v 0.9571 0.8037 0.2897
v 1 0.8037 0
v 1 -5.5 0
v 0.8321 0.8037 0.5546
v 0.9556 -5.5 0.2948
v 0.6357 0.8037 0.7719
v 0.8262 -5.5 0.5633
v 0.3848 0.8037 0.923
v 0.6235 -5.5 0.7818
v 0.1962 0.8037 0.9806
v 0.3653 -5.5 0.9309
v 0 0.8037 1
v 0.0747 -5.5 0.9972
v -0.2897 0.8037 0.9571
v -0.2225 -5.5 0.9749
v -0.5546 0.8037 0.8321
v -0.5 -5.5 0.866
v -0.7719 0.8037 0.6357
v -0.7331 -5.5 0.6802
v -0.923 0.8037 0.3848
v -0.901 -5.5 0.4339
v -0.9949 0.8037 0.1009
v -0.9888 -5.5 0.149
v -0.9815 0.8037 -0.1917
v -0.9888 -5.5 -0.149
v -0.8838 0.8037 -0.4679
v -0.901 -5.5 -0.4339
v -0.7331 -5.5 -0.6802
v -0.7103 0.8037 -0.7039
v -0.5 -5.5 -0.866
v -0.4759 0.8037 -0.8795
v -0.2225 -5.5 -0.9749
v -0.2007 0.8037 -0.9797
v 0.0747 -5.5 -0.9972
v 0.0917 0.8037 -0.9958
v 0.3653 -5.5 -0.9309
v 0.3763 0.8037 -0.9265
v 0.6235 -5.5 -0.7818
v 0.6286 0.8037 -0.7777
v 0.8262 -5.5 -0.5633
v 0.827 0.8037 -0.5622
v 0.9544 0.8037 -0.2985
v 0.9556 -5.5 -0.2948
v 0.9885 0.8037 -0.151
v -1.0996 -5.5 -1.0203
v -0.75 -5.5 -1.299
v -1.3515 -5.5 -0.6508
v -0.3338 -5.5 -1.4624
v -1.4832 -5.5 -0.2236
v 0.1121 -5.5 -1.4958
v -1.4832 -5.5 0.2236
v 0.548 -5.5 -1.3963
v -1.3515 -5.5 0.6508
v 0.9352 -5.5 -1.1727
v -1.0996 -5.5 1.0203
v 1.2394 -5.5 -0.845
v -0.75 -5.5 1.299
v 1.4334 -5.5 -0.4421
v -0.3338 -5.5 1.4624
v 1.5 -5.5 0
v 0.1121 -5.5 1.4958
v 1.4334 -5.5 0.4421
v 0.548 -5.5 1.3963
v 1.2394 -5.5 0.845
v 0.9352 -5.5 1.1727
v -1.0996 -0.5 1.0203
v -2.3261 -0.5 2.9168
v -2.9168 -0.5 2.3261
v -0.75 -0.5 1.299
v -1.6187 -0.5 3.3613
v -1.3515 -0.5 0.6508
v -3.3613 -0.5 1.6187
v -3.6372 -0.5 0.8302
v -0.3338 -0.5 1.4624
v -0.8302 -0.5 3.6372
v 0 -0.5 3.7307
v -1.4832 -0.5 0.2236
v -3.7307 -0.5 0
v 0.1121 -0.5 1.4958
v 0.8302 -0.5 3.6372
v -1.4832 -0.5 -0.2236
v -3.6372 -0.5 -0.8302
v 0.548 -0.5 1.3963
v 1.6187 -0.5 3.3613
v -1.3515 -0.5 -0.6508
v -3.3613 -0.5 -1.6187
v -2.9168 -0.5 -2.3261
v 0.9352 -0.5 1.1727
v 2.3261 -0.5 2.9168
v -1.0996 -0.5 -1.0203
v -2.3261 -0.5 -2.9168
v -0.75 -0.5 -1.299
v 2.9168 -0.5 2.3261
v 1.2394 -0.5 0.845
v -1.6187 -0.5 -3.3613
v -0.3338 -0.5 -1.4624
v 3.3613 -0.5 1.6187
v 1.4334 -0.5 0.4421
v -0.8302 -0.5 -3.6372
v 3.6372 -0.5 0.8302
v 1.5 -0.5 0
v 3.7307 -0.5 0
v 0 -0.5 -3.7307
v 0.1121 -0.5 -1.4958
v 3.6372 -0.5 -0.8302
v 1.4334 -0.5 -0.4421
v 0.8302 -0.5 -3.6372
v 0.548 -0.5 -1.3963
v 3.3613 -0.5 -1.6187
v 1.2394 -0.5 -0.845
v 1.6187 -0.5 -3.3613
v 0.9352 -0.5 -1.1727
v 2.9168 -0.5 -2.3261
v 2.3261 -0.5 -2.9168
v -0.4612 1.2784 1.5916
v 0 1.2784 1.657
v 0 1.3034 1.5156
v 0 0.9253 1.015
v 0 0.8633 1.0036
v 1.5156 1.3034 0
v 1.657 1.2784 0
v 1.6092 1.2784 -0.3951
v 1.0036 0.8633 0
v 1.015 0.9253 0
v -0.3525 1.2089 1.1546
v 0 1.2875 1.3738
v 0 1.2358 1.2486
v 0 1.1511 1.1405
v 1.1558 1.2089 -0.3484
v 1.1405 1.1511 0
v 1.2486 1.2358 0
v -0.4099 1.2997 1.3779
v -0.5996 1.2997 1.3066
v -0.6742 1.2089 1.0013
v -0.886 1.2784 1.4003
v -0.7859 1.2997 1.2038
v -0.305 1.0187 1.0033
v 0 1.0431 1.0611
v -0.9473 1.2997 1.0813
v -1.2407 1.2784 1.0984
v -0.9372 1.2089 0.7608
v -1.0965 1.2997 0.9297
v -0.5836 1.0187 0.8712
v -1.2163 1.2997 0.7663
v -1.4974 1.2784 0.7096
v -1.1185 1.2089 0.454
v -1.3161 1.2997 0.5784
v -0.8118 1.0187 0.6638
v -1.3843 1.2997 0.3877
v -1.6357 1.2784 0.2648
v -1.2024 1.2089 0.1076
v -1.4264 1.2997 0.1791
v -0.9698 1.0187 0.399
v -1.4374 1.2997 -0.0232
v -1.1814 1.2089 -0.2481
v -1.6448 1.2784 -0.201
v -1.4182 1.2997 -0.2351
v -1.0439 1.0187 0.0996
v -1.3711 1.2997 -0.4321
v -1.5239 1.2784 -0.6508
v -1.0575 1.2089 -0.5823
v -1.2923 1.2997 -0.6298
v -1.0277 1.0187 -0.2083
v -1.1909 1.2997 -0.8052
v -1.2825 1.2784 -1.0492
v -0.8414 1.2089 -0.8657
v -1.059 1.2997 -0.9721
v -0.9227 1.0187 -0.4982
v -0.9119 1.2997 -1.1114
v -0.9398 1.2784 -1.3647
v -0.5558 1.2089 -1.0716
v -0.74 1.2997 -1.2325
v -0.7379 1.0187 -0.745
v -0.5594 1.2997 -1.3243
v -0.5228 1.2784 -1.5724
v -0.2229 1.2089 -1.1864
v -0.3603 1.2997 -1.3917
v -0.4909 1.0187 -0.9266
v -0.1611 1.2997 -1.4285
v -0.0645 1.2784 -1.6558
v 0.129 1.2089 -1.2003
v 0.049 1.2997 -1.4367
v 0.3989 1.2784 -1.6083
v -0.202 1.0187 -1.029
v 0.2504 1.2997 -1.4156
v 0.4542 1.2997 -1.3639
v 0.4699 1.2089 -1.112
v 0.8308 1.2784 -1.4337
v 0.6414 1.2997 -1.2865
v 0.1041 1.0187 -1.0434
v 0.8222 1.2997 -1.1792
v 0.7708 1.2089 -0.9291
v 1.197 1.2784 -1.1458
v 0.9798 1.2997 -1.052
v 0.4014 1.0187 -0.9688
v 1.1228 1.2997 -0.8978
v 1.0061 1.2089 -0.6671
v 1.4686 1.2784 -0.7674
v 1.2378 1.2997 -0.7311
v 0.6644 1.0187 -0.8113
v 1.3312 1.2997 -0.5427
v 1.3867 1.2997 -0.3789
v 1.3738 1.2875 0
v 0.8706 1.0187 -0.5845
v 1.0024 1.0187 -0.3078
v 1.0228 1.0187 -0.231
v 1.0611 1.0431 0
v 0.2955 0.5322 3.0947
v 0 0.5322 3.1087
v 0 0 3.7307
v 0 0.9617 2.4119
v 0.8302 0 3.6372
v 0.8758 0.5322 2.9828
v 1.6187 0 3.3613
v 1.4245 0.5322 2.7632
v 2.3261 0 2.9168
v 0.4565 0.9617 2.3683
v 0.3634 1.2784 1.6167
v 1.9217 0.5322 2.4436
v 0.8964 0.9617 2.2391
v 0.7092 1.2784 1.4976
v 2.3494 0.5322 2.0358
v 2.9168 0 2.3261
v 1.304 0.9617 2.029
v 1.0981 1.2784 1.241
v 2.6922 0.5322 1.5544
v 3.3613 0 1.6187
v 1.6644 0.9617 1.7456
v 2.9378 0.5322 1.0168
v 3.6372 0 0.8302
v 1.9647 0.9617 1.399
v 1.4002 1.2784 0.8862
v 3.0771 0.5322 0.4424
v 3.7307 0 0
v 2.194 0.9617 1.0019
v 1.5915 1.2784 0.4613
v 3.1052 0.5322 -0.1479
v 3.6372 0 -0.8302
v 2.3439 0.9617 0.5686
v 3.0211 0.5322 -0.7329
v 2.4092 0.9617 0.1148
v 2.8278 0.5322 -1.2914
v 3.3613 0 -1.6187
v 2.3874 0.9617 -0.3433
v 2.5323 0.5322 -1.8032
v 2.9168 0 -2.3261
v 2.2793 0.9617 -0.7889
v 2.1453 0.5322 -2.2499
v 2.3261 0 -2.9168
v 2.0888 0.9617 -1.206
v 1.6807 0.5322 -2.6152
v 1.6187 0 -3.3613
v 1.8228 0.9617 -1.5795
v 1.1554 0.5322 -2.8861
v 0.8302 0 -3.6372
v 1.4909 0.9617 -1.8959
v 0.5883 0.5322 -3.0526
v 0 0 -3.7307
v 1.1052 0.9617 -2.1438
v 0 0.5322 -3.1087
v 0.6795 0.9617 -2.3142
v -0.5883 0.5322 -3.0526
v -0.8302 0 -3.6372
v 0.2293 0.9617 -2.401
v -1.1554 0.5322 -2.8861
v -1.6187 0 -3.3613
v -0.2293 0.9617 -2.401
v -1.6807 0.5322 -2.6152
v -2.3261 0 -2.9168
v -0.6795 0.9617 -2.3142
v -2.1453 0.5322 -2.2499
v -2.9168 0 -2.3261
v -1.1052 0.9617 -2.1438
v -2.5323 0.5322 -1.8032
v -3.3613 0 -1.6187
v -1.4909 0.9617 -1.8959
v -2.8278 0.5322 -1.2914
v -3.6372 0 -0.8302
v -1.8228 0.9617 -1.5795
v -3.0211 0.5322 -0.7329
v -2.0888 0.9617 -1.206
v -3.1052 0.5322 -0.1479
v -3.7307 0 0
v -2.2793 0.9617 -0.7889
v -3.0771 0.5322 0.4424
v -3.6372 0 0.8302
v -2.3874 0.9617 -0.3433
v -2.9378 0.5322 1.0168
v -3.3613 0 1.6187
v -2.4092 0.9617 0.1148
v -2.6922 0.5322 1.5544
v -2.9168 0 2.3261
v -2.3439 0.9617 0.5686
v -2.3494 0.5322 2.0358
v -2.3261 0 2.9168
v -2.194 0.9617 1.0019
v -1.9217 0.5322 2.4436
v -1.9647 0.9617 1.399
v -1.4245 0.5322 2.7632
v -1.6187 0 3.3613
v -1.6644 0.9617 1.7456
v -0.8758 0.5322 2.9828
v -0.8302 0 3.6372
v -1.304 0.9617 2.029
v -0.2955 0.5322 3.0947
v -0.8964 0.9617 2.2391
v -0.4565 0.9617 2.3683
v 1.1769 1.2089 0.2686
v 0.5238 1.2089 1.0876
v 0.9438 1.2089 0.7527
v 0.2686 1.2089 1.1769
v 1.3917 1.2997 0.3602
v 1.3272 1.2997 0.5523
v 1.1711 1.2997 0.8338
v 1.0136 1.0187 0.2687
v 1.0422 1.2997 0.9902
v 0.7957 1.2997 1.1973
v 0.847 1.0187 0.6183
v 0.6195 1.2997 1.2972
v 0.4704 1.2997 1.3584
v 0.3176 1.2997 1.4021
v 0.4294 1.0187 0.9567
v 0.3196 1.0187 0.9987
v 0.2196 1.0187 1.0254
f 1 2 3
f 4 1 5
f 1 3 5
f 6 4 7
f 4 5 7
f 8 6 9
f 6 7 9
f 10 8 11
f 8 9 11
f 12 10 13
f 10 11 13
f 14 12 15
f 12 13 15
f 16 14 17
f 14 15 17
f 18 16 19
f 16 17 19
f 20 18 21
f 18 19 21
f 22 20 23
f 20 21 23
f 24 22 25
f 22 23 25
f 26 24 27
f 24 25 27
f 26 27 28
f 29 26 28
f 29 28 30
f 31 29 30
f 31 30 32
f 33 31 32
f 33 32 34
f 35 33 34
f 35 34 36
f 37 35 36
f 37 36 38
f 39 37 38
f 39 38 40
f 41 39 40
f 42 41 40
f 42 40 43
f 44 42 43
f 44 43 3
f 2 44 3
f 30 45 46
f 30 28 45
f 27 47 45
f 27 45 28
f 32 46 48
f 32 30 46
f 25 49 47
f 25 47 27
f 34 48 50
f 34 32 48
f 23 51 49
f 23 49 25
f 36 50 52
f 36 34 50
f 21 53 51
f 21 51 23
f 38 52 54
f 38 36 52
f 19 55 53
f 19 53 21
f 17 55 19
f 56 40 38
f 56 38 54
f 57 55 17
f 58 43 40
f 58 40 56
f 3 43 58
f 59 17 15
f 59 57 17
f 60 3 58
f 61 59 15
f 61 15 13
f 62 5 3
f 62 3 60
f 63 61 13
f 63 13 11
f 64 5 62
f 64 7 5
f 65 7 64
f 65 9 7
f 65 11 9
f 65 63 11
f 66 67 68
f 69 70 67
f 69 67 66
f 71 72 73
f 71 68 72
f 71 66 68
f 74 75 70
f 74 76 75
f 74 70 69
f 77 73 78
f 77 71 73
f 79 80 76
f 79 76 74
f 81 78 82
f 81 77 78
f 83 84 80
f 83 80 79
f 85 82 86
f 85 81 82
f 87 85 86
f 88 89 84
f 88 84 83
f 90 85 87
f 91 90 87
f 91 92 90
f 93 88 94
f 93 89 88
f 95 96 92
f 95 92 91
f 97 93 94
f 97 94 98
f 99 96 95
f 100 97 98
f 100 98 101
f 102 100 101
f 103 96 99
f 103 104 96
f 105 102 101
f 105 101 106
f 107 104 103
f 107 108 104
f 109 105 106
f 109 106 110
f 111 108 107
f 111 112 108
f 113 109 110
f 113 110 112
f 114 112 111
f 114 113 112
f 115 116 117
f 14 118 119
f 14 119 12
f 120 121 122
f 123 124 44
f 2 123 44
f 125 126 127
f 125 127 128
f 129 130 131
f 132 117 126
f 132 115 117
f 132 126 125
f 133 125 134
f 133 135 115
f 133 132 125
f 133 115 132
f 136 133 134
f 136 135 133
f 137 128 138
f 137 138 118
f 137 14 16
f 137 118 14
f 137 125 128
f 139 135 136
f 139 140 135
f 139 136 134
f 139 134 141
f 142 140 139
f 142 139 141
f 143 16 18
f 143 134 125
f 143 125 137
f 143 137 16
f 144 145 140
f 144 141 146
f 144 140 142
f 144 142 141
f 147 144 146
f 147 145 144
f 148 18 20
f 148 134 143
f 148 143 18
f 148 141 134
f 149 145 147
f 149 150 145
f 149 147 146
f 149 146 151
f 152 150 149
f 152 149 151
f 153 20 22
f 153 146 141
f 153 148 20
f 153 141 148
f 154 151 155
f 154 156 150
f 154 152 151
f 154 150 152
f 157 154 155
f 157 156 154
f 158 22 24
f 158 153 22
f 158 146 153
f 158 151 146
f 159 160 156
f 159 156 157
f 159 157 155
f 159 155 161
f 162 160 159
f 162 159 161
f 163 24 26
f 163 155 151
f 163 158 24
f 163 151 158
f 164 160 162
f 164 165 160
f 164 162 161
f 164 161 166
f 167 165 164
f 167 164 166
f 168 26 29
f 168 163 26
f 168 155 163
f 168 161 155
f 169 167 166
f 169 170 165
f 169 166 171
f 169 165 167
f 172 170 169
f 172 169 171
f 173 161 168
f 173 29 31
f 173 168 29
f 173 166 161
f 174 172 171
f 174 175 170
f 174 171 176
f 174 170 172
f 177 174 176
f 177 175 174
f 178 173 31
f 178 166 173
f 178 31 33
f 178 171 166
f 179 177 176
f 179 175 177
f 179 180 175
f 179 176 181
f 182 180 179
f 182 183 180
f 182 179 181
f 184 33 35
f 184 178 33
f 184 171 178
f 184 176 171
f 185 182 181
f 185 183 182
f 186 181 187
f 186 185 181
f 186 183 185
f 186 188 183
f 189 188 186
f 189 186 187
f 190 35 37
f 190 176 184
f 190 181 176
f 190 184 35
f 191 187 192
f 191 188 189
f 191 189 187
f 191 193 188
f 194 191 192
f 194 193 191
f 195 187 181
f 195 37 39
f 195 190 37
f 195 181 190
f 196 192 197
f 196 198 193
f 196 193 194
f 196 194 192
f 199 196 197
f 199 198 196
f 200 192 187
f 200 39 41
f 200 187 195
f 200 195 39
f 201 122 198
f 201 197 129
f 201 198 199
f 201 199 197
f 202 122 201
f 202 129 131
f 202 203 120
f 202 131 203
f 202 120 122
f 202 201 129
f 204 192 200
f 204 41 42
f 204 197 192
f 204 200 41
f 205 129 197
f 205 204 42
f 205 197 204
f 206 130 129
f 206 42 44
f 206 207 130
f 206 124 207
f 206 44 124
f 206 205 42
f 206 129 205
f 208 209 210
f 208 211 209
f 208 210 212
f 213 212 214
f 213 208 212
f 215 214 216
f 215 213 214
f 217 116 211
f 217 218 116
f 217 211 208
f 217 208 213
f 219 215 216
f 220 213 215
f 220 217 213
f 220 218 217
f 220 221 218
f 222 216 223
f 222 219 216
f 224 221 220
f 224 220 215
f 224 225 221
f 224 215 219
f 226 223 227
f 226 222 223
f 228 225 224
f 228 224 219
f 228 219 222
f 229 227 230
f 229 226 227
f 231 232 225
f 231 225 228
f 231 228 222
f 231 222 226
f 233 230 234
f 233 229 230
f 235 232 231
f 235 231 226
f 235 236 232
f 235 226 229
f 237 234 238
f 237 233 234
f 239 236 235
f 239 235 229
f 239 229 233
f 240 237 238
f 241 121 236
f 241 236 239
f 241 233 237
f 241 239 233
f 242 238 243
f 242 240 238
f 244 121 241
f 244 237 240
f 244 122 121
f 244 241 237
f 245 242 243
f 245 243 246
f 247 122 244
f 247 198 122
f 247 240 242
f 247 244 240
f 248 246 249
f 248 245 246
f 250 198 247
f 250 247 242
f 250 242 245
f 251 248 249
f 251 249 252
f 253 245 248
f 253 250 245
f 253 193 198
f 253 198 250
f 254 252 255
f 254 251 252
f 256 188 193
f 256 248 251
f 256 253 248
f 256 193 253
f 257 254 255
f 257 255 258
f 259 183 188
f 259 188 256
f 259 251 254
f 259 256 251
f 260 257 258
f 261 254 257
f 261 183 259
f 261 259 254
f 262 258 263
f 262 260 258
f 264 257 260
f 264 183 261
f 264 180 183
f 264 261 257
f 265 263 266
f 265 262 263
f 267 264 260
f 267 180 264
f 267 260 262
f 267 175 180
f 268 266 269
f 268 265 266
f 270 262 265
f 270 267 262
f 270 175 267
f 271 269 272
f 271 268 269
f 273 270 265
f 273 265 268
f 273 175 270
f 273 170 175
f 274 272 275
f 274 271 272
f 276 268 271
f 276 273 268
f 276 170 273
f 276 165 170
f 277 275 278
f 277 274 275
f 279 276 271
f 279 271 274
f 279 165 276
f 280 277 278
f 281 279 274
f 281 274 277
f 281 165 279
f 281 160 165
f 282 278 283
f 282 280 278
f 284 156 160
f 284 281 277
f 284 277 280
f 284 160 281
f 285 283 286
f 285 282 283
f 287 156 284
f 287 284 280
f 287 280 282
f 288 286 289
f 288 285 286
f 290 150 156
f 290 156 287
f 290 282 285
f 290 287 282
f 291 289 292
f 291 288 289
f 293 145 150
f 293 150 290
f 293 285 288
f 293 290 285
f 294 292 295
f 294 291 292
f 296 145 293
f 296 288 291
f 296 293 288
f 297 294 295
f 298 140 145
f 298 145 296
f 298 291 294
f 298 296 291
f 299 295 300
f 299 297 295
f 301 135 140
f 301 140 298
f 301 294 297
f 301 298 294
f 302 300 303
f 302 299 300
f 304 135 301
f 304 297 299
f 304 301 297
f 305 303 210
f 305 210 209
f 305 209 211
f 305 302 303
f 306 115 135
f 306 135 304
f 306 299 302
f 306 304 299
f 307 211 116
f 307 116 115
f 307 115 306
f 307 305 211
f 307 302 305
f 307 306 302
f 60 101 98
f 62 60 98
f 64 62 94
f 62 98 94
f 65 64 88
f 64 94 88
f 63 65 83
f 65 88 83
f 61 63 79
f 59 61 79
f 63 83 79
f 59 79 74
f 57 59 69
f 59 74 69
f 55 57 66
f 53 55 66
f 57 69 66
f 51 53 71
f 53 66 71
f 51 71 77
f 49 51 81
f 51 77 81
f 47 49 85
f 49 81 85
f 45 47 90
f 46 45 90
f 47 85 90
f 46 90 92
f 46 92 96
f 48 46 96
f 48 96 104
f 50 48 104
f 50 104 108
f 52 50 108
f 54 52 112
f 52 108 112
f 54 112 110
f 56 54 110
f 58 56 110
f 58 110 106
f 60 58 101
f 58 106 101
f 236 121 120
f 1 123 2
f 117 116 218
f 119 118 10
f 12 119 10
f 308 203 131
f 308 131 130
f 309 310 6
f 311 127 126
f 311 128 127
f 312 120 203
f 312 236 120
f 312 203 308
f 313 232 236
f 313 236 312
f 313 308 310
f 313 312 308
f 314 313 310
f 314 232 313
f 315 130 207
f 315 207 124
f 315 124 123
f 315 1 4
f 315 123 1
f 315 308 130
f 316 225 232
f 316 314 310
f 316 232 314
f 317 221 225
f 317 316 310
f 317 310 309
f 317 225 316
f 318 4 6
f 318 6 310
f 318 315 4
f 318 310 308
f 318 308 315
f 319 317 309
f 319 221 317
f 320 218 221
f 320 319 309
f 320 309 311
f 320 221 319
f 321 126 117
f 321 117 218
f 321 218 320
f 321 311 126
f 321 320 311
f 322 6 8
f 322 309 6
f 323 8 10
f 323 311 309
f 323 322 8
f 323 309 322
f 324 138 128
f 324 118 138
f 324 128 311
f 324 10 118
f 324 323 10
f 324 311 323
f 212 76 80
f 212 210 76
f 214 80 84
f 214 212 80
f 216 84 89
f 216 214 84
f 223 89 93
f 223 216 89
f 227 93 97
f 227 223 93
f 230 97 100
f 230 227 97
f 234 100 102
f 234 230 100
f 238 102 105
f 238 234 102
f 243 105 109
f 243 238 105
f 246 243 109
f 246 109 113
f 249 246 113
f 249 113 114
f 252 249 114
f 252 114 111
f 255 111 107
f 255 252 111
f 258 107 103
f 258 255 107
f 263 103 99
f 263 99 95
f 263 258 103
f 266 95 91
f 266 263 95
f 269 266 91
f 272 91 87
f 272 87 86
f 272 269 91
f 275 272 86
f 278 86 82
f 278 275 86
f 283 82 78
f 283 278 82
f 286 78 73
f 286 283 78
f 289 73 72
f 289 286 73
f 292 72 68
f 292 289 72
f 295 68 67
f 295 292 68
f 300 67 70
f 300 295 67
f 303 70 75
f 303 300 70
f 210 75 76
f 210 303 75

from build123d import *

# Parameters (mm, degrees)
SKETCH3_R           = 1.5
BOSS_EXTRUDE1_DEPTH = 5
SKETCH4_R           = 1
CUT_EXTRUDE1_DEPTH  = 8.04531685
FILLET1_R           = 0.5


with BuildPart() as part:
    # Sketch2 → Revolve2 (revolve)
    with BuildSketch(Plane(origin=(0, 0, 0), x_dir=(0, 0, -1), z_dir=(1, 0, 0))):
        with BuildLine():
            Line((0, 1.54531685), (0, 0))
            Line((0, 0), (0, -0.5))
            Line((0, -0.5), (-3.730724896, -0.5))
            Line((-3.730724896, -0.5), (-3.730724896, 0))
            ThreePointArc((-3.730724896, 0), (-2.019053765, 1.143702085), (0, 1.54531685))
        make_face()
    revolve(axis=Axis((0, -0.5, 0), (0, 1, 0)))

    # Sketch3 → Boss-Extrude1 (add)
    with BuildSketch(Plane.XZ.offset(0.5)):
        Circle(SKETCH3_R)
    extrude(amount=BOSS_EXTRUDE1_DEPTH)

    # Sketch4 → Cut-Extrude1 (cut, through all)
    with BuildSketch(Plane.XZ.offset(5.5)):
        Circle(SKETCH4_R)
    extrude(amount=-CUT_EXTRUDE1_DEPTH, mode=Mode.SUBTRACT)

    # Fillet1
    fillet1_edges = [part.edges().sort_by_distance(p)[0] for p in [
        (-0.707106781, 1.449682086, -0.707106781),
    ]]
    fillet(fillet1_edges, radius=FILLET1_R)


solid = part.part
